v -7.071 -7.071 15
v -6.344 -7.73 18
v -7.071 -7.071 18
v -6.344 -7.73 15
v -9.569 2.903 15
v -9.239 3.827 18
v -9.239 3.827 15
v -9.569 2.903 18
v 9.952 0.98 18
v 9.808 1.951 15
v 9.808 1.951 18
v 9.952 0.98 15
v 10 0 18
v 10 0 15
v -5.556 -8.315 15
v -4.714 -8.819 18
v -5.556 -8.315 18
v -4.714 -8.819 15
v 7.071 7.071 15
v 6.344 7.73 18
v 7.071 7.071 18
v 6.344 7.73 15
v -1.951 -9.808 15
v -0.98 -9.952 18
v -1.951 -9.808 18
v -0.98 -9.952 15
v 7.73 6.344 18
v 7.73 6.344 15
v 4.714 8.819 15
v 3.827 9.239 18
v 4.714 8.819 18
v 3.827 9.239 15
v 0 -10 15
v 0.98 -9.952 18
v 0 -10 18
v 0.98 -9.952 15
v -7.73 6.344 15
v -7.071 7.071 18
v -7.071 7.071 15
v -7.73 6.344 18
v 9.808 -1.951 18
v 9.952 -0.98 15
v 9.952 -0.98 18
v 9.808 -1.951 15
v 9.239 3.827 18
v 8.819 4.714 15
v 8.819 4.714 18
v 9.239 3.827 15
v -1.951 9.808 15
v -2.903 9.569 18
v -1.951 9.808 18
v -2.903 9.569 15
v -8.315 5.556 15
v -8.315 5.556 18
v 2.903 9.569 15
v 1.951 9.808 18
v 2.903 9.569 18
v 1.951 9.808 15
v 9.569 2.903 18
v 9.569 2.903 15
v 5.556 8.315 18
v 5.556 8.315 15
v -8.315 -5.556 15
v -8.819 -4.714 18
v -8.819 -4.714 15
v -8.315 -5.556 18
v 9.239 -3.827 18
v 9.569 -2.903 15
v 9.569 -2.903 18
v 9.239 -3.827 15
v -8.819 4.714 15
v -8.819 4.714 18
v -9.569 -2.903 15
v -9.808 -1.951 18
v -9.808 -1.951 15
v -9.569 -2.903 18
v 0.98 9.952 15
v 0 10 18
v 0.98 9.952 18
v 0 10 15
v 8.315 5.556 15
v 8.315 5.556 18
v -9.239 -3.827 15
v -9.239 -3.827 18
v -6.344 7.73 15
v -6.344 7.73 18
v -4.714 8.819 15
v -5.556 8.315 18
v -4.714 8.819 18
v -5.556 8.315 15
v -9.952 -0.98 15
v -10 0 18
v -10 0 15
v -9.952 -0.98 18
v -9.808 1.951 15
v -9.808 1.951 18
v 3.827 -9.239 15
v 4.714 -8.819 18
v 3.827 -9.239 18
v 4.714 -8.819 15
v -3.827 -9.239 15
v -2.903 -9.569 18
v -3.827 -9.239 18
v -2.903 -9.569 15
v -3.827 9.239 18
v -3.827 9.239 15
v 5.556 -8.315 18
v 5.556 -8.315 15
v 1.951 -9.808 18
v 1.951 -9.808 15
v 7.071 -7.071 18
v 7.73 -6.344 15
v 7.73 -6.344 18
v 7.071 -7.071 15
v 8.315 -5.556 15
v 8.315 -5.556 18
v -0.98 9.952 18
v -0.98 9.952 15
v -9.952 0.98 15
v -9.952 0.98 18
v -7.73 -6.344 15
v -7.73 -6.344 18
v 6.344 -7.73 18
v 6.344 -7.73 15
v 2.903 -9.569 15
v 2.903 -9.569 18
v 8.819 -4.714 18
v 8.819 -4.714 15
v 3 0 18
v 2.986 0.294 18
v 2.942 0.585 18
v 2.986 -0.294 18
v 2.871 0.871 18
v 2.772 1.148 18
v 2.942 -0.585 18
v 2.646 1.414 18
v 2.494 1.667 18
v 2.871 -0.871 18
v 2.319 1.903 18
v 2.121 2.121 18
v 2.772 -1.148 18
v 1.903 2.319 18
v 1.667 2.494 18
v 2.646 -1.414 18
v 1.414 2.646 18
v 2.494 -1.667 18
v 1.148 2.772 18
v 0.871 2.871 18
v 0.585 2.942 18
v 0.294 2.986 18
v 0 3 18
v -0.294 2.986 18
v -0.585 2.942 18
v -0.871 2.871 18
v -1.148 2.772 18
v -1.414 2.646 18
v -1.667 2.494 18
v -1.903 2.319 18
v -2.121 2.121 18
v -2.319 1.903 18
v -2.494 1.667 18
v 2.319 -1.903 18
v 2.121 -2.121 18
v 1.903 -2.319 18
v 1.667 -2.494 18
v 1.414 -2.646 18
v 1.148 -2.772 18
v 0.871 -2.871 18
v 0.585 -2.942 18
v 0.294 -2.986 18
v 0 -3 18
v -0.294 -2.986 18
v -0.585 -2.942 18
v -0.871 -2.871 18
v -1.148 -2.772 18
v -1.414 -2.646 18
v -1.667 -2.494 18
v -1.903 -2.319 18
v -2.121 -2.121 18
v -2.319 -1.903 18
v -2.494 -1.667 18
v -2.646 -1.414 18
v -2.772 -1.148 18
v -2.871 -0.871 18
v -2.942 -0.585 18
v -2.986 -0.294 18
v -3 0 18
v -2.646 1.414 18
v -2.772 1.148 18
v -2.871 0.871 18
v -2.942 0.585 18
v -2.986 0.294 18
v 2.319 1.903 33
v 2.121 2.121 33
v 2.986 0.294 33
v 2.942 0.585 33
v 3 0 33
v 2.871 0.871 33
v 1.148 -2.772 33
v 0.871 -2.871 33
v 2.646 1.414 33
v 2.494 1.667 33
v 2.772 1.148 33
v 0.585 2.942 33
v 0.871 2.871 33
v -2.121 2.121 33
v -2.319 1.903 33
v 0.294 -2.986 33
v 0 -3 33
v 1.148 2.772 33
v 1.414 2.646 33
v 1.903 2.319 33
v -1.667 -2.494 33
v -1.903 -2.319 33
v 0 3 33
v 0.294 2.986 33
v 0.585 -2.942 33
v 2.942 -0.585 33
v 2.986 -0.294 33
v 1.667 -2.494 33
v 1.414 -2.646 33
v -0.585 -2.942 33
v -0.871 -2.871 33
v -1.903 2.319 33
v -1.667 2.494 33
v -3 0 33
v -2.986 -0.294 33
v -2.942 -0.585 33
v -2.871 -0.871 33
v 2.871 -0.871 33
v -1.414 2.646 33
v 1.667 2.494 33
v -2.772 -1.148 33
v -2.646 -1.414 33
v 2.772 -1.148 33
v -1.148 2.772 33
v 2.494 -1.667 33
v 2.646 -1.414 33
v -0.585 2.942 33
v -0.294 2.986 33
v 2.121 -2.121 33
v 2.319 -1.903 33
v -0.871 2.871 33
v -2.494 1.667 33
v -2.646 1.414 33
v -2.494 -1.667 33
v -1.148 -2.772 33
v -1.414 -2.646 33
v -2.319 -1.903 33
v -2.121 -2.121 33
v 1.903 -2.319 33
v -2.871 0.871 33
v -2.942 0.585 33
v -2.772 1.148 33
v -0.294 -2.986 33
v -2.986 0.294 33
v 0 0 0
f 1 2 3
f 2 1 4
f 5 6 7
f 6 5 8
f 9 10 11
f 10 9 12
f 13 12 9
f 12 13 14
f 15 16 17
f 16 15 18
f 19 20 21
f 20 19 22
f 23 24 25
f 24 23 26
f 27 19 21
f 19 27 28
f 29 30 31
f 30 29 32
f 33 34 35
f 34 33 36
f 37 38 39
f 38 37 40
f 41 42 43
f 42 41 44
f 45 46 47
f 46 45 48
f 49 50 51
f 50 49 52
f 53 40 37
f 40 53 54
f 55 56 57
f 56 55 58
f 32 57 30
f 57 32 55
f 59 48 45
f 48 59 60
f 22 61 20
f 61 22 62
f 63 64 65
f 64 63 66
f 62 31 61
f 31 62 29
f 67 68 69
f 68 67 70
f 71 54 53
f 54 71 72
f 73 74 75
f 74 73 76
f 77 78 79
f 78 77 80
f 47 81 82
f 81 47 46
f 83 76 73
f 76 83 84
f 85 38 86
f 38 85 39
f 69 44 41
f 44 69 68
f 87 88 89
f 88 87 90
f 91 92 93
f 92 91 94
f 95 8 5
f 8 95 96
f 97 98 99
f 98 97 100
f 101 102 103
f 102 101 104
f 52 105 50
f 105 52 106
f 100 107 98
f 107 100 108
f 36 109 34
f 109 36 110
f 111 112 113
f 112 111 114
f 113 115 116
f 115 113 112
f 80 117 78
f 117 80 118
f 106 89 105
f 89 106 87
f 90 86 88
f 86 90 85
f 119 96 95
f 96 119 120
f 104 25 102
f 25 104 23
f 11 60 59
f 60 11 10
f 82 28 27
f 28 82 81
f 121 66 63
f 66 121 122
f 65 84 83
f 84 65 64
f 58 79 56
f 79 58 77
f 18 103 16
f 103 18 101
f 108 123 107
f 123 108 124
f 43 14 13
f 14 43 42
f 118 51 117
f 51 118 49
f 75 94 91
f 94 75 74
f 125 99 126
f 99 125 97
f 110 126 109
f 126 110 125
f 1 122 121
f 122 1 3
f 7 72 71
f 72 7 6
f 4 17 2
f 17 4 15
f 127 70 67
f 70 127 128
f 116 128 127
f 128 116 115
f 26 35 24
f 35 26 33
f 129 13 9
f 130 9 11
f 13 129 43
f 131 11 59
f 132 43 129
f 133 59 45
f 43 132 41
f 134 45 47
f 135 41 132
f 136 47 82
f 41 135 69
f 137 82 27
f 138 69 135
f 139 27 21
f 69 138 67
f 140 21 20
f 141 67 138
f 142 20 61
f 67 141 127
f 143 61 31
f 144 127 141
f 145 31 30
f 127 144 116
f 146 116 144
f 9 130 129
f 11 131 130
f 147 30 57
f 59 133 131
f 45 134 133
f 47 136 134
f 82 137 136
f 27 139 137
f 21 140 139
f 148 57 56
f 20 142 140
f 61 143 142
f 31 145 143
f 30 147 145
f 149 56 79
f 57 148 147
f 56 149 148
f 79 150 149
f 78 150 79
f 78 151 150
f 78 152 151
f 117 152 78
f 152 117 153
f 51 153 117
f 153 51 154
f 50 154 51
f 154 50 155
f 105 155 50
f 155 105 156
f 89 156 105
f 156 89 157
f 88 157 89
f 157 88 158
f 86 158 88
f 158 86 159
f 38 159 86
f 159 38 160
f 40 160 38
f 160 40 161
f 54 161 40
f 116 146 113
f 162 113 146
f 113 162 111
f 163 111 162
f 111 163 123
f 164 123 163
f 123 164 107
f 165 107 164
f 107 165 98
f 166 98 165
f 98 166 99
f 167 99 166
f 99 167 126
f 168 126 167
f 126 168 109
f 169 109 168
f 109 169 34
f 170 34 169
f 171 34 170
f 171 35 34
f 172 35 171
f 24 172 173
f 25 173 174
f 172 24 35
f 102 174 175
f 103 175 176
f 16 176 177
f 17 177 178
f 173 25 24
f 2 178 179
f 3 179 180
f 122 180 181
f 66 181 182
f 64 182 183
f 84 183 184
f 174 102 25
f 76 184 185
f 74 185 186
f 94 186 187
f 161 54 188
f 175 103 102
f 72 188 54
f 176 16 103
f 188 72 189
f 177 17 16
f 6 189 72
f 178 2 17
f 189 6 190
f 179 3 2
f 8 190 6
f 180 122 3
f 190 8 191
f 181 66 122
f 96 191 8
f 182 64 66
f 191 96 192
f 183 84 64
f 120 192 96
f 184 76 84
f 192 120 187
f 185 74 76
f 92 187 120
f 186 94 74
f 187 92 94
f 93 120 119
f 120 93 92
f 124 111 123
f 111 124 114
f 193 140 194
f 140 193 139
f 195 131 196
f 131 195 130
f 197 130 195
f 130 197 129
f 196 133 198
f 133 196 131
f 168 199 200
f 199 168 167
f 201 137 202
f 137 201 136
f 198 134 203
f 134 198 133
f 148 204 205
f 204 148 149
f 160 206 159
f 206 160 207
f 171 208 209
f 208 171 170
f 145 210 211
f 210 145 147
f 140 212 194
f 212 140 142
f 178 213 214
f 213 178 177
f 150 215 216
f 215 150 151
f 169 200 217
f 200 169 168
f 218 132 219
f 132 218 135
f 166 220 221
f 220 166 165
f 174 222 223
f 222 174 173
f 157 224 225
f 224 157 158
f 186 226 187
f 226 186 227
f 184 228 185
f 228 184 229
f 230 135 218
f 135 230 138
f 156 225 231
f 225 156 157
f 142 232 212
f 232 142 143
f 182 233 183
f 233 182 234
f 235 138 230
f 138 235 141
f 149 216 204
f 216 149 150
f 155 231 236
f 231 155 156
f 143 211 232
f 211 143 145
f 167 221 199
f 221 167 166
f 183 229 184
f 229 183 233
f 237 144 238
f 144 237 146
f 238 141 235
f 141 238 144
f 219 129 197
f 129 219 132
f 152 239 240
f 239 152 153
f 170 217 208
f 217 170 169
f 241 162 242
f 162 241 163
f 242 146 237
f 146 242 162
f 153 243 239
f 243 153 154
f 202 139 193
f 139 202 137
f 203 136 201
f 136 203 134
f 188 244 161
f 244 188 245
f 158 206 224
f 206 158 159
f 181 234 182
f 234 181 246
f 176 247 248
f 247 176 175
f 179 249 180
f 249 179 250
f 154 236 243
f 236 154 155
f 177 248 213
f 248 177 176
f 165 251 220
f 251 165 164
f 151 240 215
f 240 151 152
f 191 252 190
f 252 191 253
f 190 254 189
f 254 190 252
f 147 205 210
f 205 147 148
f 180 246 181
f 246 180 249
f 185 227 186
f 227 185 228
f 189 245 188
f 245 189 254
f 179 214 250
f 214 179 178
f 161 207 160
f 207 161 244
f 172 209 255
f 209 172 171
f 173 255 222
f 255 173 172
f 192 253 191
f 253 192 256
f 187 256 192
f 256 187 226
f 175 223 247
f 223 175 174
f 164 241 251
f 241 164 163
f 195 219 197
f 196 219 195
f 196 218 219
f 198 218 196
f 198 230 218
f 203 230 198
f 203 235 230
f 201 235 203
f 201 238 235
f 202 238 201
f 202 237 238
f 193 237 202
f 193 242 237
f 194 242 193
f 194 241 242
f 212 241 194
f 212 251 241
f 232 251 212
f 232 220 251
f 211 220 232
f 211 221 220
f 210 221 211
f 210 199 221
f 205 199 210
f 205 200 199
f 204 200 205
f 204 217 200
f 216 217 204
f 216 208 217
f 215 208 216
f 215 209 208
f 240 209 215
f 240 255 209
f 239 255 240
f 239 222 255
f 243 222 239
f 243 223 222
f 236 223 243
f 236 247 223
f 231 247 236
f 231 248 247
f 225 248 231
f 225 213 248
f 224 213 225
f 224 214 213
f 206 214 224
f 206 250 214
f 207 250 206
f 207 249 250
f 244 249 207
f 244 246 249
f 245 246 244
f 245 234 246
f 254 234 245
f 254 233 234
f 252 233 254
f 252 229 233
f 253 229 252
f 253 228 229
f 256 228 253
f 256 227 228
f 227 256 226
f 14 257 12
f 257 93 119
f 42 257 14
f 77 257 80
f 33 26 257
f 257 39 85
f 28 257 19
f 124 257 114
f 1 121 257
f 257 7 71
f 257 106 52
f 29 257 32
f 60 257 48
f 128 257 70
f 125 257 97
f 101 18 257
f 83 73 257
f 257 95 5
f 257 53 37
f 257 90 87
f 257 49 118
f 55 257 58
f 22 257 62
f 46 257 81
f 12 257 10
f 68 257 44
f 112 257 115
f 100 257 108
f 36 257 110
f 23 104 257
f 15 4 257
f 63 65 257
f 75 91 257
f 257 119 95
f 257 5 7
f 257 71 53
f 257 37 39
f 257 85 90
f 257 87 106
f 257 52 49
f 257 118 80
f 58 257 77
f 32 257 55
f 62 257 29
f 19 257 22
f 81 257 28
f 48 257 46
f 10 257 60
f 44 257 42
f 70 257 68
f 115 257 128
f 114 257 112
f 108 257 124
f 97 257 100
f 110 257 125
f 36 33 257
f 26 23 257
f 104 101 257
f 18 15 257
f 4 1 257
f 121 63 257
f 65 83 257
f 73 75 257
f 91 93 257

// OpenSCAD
// [FL_INDEX: keywords="openscad, 3d_parametric, Customizable_Parametric_spinning_top, csg_solid" | COT="Parametric OpenSCAD design from 3DCodeverse"]
// Title: Customizable Parametric spinning top


//######################VARIBLES#####################
//handle properties

//handle height
handle_height = 15;
//handle diamater
handle_diamater = 6;

//(optional) cylinder flywheel

//use flywheel
flywheel = "on";//[on, off]
//flywheel height
flywheel_height = 3;
//flywheel diamater
flywheel_diamater = 20;

//cone (can act as flywheel)

//cone height
cone_height = 15;
//cone diamater
cone_top_diamater = 20;

//seperate objects(for supportless printing)
seperate = "off";//[on,off]

//seperation distance
sep_dist = 10;
//joiner
join = "clip";//[none, pin, clip]
//joiner width
join_d = 4;
//joiner length
join_l = 5;
//tolerance(free space left in joiner, good if your pritner isnt accurate)
tolerance = 0.1;

//accuracy
$fn=64;
//#################END OF VARIABLES##################

//converting units
handle_r = handle_diamater/2;
flywheel_r = flywheel_diamater/2;
cone_top_r = cone_top_diamater/2;
join_r = join_d/2;

//simple old code, no seperation
if (seperate == "off")
{
	//bottom cone
	cylinder(cone_height, 0, cone_top_r);
	
	//different behaviour with and without flywheel
	if(flywheel == "on")
	{
		//flywheel
		translate([0,0,cone_height]) cylinder(flywheel_height, flywheel_r, flywheel_r);
		//handle
		translate([0,0,cone_height+flywheel_height]) cylinder(handle_height, handle_r, handle_r);
	}
	else
	{
		translate([0,0,cone_height]) cylinder(handle_height, handle_r, handle_r);
	}
}
else//seperate code
{
		//handle
	cylinder(handle_height, handle_r, handle_r);
	//joiner
	translate([0,0,handle_height])joiner();
	//different logic needed with and without flywheel
	if(flywheel == "on")
	{	
		//is the cone or flywheel larger
		if(flywheel_r > cone_top_r)
		{	
			difference()
			{
				//make flywheel/cone into one object
				union()	
				{
					//make flywheel
					translate([handle_r+flywheel_r+sep_dist,0,0]) cylinder(flywheel_height, flywheel_r, flywheel_r);
					//make cone
					translate([handle_r+flywheel_r+sep_dist,0,flywheel_height]) cylinder(cone_height,cone_top_r, 0);
				}
				translate([handle_r+flywheel_r+sep_dist,0,0])joiner("female");
			}
		
		}
		else
		{	
			echo("WARNING : cone bigger than flywheel, overhang inevitable!!!!!!(unless the overhang is very small, you should inspect the model before use)");
			difference()
			{
				//make flywheel/cone into one object
				union()	
				{
					//make flywheel
					translate([handle_r+cone_top_r+sep_dist,0,0]) cylinder(flywheel_height, flywheel_r, flywheel_r);
					//make cone
					translate([handle_r+cone_top_r+sep_dist,0,flywheel_height]) cylinder(cone_height,cone_top_r, 0);
				}
				translate([handle_r+cone_top_r+sep_dist,0,0])joiner("female");
			}
		}
	}
	else
	{
		//put clip/pin hole in cone
		difference()
			{
				//make cone
				translate([handle_r+cone_top_r+sep_dist,0,0]) cylinder(cone_height,cone_top_r, 0);
				translate([handle_r+cone_top_r+sep_dist,0,0])joiner("female");
			}
	}
}

//simple place for all joiners(used to be repeated many times)
module joiner(gen = "male", type = join, joinerl = join_l, joinerr = join_r, tol = tolerance)
{
	//male clip
	if (gen == "male")
	{
		if(type == "pin")
		{
			//simple cylinder pin	
			cylinder(joinerl,joinerr,joinerr);
		}
		if(type == "clip")
		{
			//press clip
			difference()
			{
				//start with pin shaped cylinder
				cylinder(joinerl,joinerr,joinerr);
				difference()
				{
					//create mask to remove narrow portion
					//start with a larger shorter cylinder, then hollow out the middle
					translate([0,0,-1]) cylinder(joinerl*0.7+1,joinerr*1.1,joinerr*1.1);
					translate([0,0,-1]) cylinder(joinerl*0.7+1,joinerr*0.8,joinerr*0.8);
				}
				difference()
				{
					//bevel on top for easy use
					//mask made with large cylinder, then subtracting bevel shape using cone cylinder
					translate([0,0,joinerl*0.8]) cylinder(joinerl,joinerr*1.1,joinerr);
					translate([0,0,joinerl*0.8]) cylinder(joinerl*0.7,joinerr,0);
				}
				//take out slice in middle
				translate([0-joinerr*1.1,0-joinerr*0.3,joinerl*0.2]) cube([joinerr*2.2,joinerr*0.6, joinerl*1.1]);
				//trim the sides to make them flat, anti spin, ease of use
				translate([0-joinerr*1.05,0-joinerr,0-joinerl*0.05]) cube([joinerr*0.3,joinerr*2,joinerl*1.1]);
				translate([joinerr*0.75,0-joinerr,0-joinerl*0.05]) cube([joinerr*0.3,joinerr*2,joinerl*1.1]);
			}
		}
	}
	//female mask, to subtract
	if(gen == "female")
	{
		if(type == "pin")
		{
			translate([0,0,0])cylinder(joinerl+tol,joinerr+tol,joinerr+tol);
		}
		if(type == "clip")
		{
			difference()
			{
				//start with pin shaped cylinder, bigger for tolerance
				cylinder(joinerl+tol,joinerr+tol,joinerr+tol);
				difference()
				{
					//create mask to remove narrow portion, with more tolerance	
					//start with a larger shorter cylinder, then hollow out the middle
					cylinder(joinerl*0.7-tol,joinerr*1.1+tol,joinerr*1.1+tol);
					cylinder(joinerl*0.7-tol,joinerr*0.8+tol,joinerr*0.8+tol);
				}
				//trim the sides to make them flat, anti spin, ease of use
				translate([0-joinerr*1.05-tol,0-joinerr,0-joinerl*0.05]) cube([joinerr*0.3,joinerr*2,joinerl*1.1]);
				translate([joinerr*0.75+tol,0-joinerr,0-joinerl*0.05]) cube([joinerr*0.3,joinerr*2,joinerl*1.1]);
			}
		}
	}
}
